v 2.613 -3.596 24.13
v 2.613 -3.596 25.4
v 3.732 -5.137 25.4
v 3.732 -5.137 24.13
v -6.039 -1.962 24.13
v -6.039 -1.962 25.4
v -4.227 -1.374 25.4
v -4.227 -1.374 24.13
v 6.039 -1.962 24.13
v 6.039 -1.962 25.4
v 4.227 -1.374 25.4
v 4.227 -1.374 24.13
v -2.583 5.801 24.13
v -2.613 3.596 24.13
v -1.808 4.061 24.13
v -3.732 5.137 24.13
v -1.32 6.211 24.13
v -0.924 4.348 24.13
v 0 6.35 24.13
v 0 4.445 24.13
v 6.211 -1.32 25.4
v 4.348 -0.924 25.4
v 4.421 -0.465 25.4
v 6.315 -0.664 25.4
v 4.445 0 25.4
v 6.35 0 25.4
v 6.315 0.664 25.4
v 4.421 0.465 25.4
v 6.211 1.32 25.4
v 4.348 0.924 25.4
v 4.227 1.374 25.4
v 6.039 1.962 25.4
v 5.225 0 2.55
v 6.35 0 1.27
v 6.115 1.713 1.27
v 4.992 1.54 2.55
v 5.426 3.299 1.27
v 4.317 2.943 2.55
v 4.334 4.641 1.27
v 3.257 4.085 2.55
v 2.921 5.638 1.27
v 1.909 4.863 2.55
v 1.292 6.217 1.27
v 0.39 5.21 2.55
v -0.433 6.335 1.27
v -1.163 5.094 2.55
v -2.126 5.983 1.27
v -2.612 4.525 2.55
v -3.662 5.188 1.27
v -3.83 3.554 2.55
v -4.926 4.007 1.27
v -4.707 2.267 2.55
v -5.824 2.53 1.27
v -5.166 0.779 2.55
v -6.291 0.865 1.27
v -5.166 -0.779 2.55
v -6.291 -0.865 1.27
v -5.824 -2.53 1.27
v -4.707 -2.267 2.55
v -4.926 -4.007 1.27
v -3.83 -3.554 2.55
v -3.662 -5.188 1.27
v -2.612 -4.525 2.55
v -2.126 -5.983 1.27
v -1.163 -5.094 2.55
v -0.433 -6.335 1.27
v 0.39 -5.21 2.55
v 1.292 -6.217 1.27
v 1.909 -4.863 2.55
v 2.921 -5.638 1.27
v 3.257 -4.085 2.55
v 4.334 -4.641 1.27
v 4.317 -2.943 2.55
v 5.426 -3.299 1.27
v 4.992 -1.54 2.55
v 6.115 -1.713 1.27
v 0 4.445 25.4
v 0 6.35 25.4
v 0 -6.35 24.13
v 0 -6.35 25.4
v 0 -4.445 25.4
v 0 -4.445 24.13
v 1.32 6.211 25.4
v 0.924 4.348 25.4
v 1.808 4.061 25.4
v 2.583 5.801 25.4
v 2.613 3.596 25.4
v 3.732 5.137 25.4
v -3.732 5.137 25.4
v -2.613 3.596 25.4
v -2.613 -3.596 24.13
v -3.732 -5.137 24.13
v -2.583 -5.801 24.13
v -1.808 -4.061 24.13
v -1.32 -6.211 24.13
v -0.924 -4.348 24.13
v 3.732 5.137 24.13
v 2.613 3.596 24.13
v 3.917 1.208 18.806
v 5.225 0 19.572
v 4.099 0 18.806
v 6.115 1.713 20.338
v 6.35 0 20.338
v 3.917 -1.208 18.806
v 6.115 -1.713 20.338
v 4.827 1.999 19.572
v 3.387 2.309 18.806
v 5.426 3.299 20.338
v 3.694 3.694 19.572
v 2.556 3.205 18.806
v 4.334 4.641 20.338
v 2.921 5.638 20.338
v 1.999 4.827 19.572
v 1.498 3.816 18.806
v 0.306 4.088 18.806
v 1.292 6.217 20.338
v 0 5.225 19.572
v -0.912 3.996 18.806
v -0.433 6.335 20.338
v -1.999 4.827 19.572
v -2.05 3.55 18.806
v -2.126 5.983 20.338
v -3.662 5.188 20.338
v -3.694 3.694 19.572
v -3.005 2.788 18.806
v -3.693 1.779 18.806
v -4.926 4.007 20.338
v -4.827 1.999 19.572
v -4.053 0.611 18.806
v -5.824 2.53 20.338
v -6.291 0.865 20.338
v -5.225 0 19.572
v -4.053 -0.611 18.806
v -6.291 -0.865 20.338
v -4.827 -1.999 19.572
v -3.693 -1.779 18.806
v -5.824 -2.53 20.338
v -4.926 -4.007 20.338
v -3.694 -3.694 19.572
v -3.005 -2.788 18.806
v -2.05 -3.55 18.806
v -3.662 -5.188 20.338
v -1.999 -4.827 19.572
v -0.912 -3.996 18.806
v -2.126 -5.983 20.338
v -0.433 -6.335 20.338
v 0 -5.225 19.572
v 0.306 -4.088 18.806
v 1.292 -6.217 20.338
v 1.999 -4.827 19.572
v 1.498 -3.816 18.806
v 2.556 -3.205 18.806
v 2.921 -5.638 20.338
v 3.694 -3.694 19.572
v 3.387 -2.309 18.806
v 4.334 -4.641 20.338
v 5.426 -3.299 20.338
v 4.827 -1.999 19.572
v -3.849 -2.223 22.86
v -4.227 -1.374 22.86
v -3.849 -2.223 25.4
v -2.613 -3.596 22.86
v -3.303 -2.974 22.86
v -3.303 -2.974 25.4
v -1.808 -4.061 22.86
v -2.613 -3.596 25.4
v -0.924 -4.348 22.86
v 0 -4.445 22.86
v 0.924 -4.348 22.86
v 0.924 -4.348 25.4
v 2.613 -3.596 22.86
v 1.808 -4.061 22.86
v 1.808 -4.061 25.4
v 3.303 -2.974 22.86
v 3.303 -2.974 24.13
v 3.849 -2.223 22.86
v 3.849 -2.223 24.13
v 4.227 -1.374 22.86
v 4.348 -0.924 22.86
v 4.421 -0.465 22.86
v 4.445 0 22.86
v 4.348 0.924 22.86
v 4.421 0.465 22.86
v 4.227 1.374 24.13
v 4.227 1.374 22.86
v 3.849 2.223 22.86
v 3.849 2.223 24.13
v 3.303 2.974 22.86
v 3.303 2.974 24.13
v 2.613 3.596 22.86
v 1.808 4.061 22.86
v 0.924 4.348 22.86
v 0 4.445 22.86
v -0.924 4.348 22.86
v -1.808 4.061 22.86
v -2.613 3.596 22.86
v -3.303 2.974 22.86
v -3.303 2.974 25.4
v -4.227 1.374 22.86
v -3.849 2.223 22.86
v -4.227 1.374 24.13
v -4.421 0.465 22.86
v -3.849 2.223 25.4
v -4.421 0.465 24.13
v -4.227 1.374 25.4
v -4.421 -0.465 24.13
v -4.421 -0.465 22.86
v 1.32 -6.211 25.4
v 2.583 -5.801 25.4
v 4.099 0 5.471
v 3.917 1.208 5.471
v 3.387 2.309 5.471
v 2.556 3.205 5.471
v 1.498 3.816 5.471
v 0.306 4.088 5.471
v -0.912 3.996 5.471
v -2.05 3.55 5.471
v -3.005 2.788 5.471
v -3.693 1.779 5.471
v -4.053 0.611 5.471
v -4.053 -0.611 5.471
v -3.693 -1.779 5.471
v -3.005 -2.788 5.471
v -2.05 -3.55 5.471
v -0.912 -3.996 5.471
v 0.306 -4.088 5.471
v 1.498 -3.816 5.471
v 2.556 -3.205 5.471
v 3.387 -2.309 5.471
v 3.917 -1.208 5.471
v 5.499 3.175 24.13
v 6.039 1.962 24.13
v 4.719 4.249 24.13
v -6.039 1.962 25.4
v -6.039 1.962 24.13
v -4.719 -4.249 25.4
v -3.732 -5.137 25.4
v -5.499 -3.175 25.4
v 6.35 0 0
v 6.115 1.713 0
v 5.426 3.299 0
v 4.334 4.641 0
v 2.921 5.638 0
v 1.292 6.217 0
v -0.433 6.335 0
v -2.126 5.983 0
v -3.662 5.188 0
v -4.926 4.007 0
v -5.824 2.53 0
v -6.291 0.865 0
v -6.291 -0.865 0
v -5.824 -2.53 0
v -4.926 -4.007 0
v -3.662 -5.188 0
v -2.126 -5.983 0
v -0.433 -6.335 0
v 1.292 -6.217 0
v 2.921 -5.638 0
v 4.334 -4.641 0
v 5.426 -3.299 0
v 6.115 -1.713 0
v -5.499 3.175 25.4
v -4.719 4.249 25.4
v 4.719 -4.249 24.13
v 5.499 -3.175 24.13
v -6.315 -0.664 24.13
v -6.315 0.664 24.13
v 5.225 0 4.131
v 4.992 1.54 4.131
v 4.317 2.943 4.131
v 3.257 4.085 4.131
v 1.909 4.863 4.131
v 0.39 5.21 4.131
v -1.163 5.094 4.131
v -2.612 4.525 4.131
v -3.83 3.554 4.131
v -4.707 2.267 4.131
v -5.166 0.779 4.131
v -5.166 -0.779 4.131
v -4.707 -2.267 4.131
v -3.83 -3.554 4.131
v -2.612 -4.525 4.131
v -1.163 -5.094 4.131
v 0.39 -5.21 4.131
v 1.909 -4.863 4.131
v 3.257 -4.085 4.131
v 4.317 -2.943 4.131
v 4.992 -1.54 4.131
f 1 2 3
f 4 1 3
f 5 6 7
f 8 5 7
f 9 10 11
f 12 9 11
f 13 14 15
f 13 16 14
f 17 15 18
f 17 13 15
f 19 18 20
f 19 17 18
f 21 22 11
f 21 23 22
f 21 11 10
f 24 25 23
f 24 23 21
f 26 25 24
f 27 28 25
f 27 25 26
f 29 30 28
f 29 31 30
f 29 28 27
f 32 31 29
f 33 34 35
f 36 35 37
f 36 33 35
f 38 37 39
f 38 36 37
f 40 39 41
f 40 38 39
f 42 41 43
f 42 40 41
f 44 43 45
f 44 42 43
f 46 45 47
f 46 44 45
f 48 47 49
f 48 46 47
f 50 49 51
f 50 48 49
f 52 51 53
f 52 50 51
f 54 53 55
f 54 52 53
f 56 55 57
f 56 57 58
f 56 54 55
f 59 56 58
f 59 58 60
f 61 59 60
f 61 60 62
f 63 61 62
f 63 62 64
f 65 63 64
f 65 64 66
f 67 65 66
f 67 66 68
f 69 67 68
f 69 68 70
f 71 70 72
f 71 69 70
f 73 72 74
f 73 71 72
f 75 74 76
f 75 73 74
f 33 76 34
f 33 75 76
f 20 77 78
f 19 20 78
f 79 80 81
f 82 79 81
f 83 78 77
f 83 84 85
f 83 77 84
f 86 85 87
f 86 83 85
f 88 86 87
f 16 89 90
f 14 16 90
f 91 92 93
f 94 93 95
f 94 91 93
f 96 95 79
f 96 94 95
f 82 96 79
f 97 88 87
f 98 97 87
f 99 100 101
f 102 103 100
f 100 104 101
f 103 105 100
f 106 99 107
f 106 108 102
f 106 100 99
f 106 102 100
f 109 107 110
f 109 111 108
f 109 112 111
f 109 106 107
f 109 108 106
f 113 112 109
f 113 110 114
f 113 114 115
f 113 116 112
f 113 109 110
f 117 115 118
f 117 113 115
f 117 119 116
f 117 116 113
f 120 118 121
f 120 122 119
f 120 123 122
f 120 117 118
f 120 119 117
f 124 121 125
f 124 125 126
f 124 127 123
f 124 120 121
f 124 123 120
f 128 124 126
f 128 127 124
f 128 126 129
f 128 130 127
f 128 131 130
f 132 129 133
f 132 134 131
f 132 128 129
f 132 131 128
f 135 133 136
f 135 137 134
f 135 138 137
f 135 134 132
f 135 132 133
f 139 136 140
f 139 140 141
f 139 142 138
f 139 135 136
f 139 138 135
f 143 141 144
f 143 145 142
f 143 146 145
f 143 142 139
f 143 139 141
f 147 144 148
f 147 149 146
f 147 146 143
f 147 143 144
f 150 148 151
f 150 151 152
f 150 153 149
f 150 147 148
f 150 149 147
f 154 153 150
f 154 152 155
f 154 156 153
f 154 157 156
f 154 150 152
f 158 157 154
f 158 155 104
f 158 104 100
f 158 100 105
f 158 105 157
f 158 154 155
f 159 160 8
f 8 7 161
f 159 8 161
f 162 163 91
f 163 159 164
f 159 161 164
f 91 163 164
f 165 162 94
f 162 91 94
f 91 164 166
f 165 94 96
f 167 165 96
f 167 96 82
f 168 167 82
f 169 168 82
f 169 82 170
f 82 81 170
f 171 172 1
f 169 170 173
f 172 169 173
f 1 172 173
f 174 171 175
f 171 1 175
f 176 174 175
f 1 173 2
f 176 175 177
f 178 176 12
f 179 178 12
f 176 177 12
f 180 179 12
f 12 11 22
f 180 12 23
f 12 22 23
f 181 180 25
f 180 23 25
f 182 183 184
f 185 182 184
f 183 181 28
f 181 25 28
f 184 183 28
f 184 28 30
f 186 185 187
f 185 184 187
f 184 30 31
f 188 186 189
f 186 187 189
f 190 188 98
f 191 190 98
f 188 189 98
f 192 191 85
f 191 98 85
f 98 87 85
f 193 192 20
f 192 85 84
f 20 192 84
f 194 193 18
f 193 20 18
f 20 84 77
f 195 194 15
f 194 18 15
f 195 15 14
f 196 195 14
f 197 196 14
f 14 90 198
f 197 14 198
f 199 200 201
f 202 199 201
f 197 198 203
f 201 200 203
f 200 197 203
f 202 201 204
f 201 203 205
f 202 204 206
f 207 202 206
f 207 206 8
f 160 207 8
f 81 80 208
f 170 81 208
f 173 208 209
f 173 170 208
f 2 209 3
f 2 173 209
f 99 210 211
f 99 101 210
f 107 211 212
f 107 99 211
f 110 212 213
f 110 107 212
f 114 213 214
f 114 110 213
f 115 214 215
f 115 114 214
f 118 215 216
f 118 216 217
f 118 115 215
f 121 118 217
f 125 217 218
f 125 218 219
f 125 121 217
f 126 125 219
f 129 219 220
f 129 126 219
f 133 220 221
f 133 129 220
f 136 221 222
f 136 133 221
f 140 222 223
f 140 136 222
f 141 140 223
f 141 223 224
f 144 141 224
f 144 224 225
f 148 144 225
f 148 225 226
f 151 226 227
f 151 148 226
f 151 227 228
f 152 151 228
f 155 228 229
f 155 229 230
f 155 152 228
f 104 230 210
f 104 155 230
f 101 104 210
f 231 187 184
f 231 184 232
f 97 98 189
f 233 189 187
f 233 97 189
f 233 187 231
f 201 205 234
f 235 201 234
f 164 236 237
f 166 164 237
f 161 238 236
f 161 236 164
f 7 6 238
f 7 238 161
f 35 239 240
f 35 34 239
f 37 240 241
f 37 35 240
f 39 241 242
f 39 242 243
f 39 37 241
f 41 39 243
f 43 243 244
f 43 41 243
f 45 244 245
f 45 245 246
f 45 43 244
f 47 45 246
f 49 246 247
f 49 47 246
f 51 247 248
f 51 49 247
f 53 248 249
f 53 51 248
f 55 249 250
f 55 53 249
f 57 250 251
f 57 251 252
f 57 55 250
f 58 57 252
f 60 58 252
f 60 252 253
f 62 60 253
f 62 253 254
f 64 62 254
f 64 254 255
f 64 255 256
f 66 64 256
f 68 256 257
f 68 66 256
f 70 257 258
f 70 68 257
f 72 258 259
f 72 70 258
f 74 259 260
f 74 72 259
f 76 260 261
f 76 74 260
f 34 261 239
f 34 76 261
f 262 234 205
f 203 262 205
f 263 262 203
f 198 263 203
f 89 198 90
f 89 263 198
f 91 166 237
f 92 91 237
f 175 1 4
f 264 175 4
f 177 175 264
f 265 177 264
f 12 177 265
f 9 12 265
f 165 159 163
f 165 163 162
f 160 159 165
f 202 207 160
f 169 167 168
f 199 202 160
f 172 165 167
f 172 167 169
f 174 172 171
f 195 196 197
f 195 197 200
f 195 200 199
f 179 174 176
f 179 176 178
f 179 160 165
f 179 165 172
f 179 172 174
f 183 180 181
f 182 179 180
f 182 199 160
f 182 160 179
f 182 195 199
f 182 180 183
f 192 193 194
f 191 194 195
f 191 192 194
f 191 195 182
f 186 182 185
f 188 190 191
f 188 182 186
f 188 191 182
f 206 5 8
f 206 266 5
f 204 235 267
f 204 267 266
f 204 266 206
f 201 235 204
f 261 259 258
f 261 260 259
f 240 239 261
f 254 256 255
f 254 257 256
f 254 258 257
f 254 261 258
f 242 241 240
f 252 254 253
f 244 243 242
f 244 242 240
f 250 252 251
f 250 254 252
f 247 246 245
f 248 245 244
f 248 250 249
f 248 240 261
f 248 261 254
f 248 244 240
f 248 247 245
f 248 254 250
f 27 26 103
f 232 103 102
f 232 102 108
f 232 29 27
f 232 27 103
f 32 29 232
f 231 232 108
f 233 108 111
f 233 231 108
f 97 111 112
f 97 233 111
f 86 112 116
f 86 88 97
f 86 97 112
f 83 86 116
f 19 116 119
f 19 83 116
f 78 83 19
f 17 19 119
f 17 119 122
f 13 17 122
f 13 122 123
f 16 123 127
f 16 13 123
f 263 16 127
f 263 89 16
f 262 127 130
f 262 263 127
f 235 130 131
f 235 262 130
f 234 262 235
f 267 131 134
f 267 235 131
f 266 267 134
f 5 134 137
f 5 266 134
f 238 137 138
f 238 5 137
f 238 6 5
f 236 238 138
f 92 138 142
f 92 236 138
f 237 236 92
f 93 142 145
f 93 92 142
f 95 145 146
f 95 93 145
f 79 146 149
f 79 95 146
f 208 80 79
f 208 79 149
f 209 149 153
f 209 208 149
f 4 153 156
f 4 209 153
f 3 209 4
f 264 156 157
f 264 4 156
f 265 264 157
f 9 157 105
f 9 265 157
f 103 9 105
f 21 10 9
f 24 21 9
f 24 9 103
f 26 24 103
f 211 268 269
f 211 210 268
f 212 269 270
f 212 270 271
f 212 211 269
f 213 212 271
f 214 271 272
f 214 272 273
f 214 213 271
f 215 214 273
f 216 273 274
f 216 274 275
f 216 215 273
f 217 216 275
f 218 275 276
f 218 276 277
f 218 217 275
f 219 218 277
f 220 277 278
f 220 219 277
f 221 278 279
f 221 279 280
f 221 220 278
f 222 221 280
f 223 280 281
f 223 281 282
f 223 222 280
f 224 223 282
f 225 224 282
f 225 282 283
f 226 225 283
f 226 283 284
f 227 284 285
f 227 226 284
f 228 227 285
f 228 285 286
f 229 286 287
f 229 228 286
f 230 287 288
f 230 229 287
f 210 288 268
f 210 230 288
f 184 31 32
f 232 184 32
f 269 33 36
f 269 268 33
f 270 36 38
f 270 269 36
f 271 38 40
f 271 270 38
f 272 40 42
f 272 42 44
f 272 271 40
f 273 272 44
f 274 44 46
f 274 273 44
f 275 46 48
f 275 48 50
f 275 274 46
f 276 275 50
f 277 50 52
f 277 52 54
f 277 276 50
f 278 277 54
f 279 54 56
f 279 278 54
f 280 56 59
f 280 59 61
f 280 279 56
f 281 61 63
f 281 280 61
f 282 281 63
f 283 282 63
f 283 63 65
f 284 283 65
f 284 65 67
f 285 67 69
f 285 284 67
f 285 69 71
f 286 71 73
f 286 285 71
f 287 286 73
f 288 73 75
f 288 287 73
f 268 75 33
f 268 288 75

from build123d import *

# Parameters (mm, degrees)
F3_DEPTH = 1.27
F5_DEPTH = 1.27


with BuildPart() as f1:
    # F0 (on Front) → F1 (revolve)
    with BuildSketch(Plane.XZ):
        Polygon((0, 25.4), (0, 0), (6.35, 0), (6.35, 1.27), (5.2246055566, 2.5501165073), (5.2246055566, 4.1312165558), (4.0992111132, 5.4714176804), (4.0992111132, 18.806418404), (6.35, 20.3378521087), (6.35, 25.4), align=None)
    revolve(axis=Axis((0, 0, 12.7), (0, 0, 1)))

    # F2 (on face) → F3 (cut)
    with BuildSketch(Plane.XY.offset(25.4)):
        with BuildLine():
            ThreePointArc((4.2274462149, -1.37358054), (4.3902746739, -0.6953511971), (4.445, 0))
            ThreePointArc((4.445, 0), (4.3902746739, 0.6953511971), (4.2274462149, 1.37358054))
            ThreePointArc((4.2274462149, 1.37358054), (3.59608054, 2.6127054464), (2.6127054464, 3.59608054))
            ThreePointArc((2.6127054464, 3.59608054), (1.37358054, 4.2274462149), (0, 4.445))
            ThreePointArc((0, 4.445), (-1.37358054, 4.2274462149), (-2.6127054464, 3.59608054))
            ThreePointArc((-2.6127054464, 3.59608054), (-3.59608054, 2.6127054464), (-4.2274462149, 1.37358054))
            ThreePointArc((-4.2274462149, 1.37358054), (-4.445, 0), (-4.2274462149, -1.37358054))
            ThreePointArc((-4.2274462149, -1.37358054), (-3.59608054, -2.6127054464), (-2.6127054464, -3.59608054))
            ThreePointArc((-2.6127054464, -3.59608054), (-1.37358054, -4.2274462149), (0, -4.445))
            ThreePointArc((0, -4.445), (1.37358054, -4.2274462149), (2.6127054464, -3.59608054))
            ThreePointArc((2.6127054464, -3.59608054), (3.59608054, -2.6127054464), (4.2274462149, -1.37358054))
        make_face()
        with BuildLine():
            ThreePointArc((-2.6127054464, 3.59608054), (-1.37358054, 4.2274462149), (0, 4.445))
            Line((0, 4.445), (0, 6.35))
            ThreePointArc((0, 6.35), (-1.9622579143, 6.0392088785), (-3.7324363521, 5.1372579143))
            Line((-3.7324363521, 5.1372579143), (-2.6127054464, 3.59608054))
        make_face()
        with BuildLine():
            ThreePointArc((2.6127054464, 3.59608054), (3.59608054, 2.6127054464), (4.2274462149, 1.37358054))
            Line((4.2274462149, 1.37358054), (6.0392088785, 1.9622579143))
            ThreePointArc((6.0392088785, 1.9622579143), (5.1372579143, 3.7324363521), (3.7324363521, 5.1372579143))
            Line((3.7324363521, 5.1372579143), (2.6127054464, 3.59608054))
        make_face()
        with BuildLine():
            Line((6.0392088785, -1.9622579143), (4.2274462149, -1.37358054))
            ThreePointArc((4.2274462149, -1.37358054), (3.59608054, -2.6127054464), (2.6127054464, -3.59608054))
            Line((2.6127054464, -3.59608054), (3.7324363521, -5.1372579143))
            ThreePointArc((3.7324363521, -5.1372579143), (5.1372579143, -3.7324363521), (6.0392088785, -1.9622579143))
        make_face()
        with BuildLine():
            Line((0, -6.35), (0, -4.445))
            ThreePointArc((0, -4.445), (-1.37358054, -4.2274462149), (-2.6127054464, -3.59608054))
            Line((-2.6127054464, -3.59608054), (-3.7324363521, -5.1372579143))
            ThreePointArc((-3.7324363521, -5.1372579143), (-1.9622579143, -6.0392088785), (0, -6.35))
        make_face()
        with BuildLine():
            ThreePointArc((-4.2274462149, -1.37358054), (-4.445, 0), (-4.2274462149, 1.37358054))
            Line((-4.2274462149, 1.37358054), (-6.0392088785, 1.9622579143))
            ThreePointArc((-6.0392088785, 1.9622579143), (-6.35, 0), (-6.0392088785, -1.9622579143))
            Line((-6.0392088785, -1.9622579143), (-4.2274462149, -1.37358054))
        make_face()
    extrude(amount=-F3_DEPTH, mode=Mode.SUBTRACT)

    # F4 (on face) → F5 (cut)
    with BuildSketch(Plane.XY.offset(24.13)):
        with BuildLine():
            ThreePointArc((4.2274462149, -1.37358054), (4.3902746739, -0.6953511971), (4.445, 0))
            ThreePointArc((4.445, 0), (4.3902746739, 0.6953511971), (4.2274462149, 1.37358054))
            ThreePointArc((4.2274462149, 1.37358054), (3.59608054, 2.6127054464), (2.6127054464, 3.59608054))
            ThreePointArc((2.6127054464, 3.59608054), (1.37358054, 4.2274462149), (0, 4.445))
            ThreePointArc((0, 4.445), (-1.37358054, 4.2274462149), (-2.6127054464, 3.59608054))
            ThreePointArc((-2.6127054464, 3.59608054), (-3.59608054, 2.6127054464), (-4.2274462149, 1.37358054))
            ThreePointArc((-4.2274462149, 1.37358054), (-4.445, 0), (-4.2274462149, -1.37358054))
            ThreePointArc((-4.2274462149, -1.37358054), (-3.59608054, -2.6127054464), (-2.6127054464, -3.59608054))
            ThreePointArc((-2.6127054464, -3.59608054), (-1.37358054, -4.2274462149), (0, -4.445))
            ThreePointArc((0, -4.445), (1.37358054, -4.2274462149), (2.6127054464, -3.59608054))
            ThreePointArc((2.6127054464, -3.59608054), (3.59608054, -2.6127054464), (4.2274462149, -1.37358054))
        make_face()
    extrude(amount=-F5_DEPTH, mode=Mode.SUBTRACT)


solid = f1.part
